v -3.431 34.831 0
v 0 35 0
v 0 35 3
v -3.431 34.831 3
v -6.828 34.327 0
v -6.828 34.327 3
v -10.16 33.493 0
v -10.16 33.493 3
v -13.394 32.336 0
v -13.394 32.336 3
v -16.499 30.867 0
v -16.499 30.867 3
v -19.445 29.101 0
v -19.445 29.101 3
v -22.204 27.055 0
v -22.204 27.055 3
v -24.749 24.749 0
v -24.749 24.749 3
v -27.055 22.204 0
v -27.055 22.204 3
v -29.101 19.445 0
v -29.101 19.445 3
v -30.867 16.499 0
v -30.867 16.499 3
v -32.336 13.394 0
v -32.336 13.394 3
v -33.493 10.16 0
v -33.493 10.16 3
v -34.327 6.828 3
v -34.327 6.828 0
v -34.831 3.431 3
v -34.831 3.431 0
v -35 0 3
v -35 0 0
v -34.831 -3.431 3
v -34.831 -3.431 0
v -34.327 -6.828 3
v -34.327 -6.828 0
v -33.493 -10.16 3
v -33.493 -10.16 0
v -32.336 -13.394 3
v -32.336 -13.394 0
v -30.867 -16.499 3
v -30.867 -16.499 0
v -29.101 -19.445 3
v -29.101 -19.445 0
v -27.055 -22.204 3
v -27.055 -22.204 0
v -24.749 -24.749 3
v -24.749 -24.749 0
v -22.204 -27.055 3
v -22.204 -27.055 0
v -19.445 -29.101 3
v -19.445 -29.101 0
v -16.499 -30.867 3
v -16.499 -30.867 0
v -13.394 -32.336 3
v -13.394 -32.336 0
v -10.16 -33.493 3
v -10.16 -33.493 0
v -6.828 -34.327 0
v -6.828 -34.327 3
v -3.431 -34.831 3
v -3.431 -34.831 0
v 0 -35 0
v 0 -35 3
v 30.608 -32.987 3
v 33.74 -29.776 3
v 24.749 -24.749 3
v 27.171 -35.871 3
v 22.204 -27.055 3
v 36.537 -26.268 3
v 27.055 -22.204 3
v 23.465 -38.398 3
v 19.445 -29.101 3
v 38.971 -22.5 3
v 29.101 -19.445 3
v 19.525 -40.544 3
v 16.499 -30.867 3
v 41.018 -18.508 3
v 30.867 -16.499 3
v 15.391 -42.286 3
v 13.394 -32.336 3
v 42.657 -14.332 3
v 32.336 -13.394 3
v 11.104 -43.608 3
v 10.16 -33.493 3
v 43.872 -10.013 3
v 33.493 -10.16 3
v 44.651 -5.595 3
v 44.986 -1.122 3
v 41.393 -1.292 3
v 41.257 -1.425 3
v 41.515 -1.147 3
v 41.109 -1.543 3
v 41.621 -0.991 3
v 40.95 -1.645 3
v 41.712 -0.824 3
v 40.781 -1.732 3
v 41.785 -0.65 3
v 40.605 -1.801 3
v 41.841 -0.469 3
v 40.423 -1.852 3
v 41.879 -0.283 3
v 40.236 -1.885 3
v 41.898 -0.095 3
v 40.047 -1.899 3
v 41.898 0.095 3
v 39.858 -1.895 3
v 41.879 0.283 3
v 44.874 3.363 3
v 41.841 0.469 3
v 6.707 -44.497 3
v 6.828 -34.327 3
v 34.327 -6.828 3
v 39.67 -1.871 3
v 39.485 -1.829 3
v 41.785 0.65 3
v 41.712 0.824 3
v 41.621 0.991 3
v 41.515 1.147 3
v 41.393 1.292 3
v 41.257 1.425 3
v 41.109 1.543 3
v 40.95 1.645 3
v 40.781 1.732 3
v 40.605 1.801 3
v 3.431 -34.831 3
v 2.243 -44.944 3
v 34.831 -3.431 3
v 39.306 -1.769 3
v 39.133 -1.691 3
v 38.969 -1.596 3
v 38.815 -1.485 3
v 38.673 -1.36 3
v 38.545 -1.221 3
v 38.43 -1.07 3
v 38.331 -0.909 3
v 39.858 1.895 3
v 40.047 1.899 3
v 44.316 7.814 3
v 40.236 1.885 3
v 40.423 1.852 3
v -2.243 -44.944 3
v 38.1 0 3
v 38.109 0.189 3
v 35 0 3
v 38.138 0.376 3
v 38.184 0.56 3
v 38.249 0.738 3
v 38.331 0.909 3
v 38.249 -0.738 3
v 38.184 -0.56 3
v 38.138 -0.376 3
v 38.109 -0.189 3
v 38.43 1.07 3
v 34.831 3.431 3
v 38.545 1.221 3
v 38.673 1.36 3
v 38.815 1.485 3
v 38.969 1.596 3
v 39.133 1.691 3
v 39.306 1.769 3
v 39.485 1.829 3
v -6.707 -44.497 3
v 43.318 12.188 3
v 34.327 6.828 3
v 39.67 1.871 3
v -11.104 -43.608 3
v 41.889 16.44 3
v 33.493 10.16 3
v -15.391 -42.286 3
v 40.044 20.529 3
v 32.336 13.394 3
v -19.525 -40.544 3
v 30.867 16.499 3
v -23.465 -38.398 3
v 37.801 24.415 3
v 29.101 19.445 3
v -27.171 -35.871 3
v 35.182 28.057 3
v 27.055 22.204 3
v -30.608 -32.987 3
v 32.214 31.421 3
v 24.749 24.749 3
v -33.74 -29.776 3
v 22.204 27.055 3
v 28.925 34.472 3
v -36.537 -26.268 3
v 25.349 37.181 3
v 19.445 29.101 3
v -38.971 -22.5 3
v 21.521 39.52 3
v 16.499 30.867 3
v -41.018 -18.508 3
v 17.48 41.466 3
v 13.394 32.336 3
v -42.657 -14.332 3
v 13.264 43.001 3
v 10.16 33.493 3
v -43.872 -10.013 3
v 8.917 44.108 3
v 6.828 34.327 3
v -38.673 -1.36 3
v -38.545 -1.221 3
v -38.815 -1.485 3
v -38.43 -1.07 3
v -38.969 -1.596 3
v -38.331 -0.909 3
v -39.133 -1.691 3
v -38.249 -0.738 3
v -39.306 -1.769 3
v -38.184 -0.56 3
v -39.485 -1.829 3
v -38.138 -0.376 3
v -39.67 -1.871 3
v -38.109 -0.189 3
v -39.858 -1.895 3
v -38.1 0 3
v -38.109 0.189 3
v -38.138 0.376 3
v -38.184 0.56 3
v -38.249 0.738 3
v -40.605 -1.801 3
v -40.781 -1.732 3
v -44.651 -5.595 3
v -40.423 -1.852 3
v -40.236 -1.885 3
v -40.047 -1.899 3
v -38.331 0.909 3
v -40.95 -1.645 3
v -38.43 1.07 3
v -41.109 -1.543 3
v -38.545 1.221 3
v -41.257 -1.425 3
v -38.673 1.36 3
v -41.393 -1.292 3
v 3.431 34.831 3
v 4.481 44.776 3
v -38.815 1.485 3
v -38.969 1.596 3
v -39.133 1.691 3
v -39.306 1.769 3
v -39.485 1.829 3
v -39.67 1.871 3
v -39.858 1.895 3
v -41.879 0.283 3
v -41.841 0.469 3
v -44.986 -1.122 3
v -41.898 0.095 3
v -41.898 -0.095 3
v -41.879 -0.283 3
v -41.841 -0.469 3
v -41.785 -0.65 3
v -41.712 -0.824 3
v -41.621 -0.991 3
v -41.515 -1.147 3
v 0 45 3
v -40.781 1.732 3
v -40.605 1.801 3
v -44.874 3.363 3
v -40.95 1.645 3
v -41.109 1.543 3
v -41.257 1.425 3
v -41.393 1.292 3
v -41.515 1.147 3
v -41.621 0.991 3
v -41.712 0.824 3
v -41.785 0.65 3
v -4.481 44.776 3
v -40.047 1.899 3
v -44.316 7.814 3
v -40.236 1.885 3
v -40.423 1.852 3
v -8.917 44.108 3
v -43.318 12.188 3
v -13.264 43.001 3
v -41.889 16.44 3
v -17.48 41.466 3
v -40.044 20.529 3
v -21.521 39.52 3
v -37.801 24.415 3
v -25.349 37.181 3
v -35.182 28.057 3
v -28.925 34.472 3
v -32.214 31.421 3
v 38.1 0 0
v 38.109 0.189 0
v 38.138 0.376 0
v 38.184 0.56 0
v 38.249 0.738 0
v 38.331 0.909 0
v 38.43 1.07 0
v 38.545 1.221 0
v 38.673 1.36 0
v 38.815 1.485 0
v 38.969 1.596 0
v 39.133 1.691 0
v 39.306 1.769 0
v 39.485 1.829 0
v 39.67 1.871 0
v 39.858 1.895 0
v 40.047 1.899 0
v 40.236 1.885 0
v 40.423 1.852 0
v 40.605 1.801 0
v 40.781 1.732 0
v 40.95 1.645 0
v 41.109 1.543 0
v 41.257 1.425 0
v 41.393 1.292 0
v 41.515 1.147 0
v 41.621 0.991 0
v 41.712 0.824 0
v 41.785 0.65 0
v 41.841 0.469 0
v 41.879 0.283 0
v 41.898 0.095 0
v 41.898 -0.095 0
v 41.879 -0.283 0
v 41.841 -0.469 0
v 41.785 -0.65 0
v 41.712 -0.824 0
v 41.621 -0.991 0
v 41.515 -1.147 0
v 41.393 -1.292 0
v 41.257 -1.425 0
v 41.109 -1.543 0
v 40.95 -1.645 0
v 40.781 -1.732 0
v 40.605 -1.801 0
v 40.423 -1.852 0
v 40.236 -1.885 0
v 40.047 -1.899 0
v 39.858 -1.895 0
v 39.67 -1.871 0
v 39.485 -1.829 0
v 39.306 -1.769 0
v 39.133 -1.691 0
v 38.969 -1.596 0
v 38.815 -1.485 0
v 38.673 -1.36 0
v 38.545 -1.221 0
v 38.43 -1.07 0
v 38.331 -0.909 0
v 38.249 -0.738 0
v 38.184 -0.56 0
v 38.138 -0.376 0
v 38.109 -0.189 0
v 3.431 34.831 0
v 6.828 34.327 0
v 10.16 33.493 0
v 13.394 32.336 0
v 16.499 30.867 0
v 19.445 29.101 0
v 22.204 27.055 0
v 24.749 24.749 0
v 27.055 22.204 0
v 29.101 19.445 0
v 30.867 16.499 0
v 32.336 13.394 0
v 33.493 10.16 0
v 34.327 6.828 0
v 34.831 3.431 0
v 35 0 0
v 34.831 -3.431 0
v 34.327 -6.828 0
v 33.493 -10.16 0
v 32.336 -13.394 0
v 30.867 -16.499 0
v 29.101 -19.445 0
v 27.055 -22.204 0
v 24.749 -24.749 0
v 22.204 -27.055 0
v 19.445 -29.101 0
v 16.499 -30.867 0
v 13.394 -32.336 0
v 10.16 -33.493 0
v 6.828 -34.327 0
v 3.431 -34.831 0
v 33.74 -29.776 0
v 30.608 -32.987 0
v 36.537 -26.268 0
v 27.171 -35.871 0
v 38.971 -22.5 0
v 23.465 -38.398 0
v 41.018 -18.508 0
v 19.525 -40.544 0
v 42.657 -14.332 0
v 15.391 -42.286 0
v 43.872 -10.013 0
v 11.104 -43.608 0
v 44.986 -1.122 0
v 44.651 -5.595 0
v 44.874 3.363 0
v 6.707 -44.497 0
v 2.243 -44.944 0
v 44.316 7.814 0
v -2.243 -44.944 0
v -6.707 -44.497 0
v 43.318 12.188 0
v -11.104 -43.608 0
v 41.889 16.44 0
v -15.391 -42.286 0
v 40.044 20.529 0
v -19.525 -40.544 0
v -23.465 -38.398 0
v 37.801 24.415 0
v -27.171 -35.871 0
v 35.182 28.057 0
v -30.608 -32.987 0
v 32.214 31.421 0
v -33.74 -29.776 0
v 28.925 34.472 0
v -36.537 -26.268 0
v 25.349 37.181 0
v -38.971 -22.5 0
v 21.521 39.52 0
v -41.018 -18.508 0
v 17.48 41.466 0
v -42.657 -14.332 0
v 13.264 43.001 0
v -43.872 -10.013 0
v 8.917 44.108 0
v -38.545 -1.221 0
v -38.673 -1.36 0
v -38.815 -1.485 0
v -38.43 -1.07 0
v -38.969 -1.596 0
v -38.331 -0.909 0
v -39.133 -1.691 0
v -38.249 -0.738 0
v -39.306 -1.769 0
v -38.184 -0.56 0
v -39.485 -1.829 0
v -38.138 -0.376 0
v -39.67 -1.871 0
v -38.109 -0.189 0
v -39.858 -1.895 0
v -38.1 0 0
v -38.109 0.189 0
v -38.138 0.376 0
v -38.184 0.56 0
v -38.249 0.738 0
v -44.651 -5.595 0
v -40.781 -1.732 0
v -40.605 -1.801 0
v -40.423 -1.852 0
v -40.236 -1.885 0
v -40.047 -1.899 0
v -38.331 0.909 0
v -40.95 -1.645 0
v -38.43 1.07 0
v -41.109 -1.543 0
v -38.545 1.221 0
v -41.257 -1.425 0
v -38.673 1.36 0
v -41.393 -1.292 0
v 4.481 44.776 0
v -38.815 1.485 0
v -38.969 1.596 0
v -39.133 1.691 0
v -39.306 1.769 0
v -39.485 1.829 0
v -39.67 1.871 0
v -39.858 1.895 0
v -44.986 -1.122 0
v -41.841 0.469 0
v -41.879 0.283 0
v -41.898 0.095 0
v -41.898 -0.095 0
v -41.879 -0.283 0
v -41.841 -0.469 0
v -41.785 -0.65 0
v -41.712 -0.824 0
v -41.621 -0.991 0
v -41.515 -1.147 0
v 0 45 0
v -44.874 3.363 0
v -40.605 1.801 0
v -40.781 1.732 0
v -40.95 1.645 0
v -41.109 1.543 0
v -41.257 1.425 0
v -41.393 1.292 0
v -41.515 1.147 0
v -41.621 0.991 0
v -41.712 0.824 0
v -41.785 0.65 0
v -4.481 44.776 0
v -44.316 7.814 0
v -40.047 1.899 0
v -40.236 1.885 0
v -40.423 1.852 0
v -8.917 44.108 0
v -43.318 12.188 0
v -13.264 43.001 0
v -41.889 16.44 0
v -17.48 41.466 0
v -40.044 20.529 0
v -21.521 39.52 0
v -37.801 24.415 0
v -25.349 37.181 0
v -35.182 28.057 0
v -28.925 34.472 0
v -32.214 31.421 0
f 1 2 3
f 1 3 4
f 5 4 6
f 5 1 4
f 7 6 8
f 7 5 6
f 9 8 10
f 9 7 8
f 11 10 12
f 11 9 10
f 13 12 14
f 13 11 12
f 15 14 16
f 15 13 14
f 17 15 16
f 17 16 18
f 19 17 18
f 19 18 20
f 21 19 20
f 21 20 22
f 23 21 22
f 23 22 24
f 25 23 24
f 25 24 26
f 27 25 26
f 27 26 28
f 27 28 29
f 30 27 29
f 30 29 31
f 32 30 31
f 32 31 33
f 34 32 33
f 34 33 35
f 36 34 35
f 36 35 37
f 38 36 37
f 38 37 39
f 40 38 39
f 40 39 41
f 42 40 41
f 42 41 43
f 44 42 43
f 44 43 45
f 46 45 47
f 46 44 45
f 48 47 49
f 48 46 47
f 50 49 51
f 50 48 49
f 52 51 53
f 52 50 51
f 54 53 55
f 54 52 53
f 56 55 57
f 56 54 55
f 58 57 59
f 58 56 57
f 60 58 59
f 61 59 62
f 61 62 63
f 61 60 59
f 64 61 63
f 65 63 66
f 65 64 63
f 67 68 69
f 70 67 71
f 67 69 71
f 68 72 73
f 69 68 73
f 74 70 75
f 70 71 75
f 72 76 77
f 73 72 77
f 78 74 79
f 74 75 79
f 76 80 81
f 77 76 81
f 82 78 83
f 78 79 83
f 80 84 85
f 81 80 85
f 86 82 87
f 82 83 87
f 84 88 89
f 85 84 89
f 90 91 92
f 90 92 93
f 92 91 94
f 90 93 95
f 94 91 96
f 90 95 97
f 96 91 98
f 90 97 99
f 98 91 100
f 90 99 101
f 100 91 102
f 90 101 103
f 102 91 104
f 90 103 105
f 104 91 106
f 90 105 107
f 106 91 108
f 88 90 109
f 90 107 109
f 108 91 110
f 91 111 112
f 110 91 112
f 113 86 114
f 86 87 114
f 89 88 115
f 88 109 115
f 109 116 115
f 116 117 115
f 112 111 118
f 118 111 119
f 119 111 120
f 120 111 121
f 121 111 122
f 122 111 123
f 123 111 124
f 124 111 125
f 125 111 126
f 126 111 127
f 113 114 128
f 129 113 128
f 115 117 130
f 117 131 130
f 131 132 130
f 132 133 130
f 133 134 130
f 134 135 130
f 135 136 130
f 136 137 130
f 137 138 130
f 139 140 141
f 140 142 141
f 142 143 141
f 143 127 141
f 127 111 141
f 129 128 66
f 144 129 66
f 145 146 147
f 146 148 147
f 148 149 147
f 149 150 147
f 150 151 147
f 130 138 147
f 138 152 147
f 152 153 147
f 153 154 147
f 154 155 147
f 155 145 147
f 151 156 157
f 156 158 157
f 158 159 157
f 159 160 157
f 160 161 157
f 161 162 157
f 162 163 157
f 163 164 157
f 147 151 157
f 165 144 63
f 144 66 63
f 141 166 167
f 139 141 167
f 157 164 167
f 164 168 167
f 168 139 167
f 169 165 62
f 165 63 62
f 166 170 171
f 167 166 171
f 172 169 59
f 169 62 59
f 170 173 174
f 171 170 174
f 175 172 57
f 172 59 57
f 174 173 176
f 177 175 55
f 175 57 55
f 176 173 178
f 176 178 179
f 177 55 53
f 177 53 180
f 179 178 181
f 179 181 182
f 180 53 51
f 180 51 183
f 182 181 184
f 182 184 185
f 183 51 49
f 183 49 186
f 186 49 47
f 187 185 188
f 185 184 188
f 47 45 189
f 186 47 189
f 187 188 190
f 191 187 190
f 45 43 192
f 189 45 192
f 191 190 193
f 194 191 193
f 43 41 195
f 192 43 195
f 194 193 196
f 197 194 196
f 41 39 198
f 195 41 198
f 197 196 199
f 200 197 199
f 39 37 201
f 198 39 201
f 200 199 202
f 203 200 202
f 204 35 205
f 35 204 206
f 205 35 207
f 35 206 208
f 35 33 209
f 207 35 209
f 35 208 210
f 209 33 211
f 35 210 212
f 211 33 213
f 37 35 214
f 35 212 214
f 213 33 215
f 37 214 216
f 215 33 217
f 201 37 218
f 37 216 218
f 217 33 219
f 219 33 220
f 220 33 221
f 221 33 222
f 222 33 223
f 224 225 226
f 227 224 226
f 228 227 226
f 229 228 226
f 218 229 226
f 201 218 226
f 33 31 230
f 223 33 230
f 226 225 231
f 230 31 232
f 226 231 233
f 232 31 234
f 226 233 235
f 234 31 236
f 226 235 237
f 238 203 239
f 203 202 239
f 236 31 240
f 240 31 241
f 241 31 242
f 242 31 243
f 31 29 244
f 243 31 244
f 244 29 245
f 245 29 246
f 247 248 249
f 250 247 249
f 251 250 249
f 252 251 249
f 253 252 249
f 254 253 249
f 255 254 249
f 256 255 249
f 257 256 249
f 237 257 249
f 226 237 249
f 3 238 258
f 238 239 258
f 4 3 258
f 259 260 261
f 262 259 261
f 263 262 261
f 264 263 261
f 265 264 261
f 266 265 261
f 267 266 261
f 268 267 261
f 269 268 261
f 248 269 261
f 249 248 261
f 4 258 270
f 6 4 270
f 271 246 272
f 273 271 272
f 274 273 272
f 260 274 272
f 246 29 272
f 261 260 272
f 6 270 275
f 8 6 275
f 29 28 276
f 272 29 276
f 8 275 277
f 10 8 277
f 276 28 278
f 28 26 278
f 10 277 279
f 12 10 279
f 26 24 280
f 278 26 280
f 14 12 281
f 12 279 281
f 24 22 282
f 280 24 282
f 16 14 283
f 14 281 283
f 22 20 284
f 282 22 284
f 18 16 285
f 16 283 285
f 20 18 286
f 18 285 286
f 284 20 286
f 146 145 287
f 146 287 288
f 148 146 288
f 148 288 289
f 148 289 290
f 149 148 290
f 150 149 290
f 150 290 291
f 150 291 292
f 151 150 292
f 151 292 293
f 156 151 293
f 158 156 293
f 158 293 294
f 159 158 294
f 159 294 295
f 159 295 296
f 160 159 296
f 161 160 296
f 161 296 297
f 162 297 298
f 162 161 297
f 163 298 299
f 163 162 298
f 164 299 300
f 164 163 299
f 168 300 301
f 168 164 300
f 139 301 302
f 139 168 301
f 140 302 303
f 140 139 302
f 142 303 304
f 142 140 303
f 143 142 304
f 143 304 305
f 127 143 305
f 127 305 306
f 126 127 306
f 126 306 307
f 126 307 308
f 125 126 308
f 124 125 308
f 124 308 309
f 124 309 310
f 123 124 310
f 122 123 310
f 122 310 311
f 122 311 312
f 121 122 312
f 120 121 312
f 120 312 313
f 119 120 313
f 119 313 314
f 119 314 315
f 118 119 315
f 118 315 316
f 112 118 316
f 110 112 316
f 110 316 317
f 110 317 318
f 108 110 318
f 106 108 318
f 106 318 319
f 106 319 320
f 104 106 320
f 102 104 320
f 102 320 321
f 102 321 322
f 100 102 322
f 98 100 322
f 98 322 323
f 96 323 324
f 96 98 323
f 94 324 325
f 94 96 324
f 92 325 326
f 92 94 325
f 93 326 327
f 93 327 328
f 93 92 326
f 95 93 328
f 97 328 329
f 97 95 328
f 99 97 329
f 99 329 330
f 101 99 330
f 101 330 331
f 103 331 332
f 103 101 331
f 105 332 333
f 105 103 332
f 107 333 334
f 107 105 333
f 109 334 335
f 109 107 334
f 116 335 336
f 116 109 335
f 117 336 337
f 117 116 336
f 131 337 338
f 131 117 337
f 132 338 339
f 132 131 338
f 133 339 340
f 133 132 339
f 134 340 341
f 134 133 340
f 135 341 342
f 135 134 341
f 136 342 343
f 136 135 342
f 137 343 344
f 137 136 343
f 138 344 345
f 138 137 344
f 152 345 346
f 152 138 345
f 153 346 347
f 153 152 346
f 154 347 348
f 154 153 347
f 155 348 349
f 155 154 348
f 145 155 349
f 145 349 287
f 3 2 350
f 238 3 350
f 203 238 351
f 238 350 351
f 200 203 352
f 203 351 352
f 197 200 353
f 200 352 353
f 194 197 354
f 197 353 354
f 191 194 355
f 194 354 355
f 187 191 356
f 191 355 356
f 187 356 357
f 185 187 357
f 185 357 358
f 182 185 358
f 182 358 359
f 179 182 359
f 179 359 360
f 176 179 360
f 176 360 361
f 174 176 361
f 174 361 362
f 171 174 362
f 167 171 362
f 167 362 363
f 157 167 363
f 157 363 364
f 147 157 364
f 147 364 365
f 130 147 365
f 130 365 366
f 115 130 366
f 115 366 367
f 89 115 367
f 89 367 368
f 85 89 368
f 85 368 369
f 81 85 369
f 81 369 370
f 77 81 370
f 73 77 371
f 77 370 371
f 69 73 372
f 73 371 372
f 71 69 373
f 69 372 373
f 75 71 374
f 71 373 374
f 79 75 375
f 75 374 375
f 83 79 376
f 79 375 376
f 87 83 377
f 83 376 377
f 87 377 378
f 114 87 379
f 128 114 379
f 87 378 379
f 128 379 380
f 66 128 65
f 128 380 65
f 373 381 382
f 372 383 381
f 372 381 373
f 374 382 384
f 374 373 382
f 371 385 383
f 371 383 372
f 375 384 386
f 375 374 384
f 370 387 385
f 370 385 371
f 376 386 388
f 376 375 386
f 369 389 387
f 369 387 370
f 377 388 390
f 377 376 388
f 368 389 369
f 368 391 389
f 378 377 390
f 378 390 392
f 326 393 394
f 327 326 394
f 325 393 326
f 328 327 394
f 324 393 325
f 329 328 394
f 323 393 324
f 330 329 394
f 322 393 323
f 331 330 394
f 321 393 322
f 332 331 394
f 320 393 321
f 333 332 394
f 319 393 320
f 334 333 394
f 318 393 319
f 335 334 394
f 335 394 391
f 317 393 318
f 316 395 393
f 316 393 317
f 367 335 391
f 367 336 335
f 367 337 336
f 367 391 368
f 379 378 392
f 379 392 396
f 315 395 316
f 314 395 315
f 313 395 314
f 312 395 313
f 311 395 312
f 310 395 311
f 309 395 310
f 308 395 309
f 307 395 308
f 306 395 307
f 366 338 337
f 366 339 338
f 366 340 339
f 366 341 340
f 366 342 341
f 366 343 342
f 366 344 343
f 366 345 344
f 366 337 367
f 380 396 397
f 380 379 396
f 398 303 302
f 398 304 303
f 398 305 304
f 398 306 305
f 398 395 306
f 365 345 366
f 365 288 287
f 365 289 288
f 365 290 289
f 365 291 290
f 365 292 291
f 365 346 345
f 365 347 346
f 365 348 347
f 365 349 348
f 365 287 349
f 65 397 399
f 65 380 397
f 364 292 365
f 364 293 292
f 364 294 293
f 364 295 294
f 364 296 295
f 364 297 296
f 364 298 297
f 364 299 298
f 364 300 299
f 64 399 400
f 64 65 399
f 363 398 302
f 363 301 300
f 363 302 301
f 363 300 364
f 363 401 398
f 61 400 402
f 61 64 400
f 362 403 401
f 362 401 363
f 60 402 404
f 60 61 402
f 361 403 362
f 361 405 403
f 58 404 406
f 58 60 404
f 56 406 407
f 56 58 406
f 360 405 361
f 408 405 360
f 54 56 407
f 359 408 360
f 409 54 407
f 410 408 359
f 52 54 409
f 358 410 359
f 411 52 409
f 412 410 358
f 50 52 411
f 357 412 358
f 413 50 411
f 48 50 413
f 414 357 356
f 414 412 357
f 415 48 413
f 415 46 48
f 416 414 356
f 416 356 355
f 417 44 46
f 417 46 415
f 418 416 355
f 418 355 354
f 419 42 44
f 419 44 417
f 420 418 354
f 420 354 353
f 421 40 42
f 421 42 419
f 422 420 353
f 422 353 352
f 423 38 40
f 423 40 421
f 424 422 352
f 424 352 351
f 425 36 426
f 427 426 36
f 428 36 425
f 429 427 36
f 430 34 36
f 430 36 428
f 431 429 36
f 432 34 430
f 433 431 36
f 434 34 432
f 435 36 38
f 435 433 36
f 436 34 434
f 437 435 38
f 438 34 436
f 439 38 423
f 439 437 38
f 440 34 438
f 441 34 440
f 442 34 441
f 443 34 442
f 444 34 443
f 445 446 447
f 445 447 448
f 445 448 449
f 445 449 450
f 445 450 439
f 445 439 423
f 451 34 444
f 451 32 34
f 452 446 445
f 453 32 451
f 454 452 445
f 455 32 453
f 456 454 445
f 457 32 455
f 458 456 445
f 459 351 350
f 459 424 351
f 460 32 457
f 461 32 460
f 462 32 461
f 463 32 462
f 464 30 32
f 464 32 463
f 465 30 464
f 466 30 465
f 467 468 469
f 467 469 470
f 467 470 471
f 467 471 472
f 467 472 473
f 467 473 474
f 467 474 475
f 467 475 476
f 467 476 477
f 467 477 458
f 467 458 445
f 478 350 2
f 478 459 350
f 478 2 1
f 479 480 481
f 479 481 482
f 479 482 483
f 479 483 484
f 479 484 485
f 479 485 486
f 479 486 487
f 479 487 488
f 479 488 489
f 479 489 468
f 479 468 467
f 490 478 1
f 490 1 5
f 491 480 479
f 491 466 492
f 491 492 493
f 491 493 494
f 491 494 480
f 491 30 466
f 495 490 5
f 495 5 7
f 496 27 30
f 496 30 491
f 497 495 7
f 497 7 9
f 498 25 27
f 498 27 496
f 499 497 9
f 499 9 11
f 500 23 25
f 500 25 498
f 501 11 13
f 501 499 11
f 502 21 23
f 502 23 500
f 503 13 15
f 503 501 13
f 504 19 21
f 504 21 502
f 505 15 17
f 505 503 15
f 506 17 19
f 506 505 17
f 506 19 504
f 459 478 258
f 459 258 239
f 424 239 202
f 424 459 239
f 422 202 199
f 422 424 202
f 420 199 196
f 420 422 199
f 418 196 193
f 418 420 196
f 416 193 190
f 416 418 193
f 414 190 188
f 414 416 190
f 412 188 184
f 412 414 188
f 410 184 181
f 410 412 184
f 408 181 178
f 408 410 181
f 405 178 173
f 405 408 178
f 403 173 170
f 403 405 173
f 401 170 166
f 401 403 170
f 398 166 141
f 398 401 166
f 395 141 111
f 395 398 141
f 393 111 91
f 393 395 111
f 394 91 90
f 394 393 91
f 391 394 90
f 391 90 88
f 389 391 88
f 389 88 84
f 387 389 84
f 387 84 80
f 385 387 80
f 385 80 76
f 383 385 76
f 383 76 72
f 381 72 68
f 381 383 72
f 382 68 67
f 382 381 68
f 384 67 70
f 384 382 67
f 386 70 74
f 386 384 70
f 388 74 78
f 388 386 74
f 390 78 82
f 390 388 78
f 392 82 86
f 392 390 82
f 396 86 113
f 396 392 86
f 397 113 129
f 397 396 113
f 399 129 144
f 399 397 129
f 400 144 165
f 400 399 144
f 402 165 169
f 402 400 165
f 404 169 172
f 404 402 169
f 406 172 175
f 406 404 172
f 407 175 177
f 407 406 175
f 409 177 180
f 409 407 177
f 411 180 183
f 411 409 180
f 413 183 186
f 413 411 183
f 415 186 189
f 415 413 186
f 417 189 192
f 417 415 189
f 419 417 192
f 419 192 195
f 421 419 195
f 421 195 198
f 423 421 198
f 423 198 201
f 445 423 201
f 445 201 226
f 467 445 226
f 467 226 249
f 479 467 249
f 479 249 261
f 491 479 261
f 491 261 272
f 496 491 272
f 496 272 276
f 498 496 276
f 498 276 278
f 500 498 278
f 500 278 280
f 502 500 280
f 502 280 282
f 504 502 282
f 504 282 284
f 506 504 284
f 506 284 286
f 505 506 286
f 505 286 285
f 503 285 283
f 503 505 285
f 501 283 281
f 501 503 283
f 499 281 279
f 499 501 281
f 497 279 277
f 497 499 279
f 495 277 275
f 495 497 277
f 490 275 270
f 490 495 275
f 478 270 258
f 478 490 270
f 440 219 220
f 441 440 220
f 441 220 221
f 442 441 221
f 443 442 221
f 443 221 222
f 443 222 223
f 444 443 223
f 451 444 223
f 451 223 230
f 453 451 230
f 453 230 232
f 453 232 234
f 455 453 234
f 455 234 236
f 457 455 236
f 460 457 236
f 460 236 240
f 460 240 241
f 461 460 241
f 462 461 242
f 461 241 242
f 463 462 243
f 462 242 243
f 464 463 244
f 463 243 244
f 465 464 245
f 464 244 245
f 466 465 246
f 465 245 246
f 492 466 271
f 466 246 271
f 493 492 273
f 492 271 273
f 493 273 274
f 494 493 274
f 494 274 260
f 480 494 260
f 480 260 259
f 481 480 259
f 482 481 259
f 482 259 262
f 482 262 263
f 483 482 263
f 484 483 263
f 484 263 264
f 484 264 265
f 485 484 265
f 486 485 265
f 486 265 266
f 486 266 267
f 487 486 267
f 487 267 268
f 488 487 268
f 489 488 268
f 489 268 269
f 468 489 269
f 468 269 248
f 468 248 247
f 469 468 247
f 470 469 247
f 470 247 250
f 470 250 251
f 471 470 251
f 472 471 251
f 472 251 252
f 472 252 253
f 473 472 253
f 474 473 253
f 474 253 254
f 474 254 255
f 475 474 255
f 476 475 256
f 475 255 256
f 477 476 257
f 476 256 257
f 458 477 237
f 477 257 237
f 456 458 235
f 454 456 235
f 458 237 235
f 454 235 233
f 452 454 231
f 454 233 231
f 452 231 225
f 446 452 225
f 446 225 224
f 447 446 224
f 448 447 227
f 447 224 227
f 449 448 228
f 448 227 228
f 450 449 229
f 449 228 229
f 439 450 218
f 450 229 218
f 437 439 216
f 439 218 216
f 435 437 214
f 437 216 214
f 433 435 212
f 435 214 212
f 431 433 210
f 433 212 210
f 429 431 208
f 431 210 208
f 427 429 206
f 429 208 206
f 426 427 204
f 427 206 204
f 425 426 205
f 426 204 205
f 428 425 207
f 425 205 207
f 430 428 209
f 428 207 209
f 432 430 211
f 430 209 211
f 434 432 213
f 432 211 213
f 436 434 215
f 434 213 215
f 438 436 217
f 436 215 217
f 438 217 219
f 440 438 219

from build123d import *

# Parameters (mm, degrees)
F0_R     = 45
F0_R_2   = 35
F1_DEPTH = 3
F2_R     = 1.9
F3_DEPTH = 25
F4_W     = 55.17469
F4_H     = 97.550949
F5_DEPTH = 25


with BuildPart() as f1:
    # F0 (on Top) → F1 (new body)
    with BuildSketch(Plane.XY):
        Circle(F0_R)
        Circle(F0_R_2, mode=Mode.SUBTRACT)
    extrude(amount=F1_DEPTH)

    # F2 (on face) → F3 (cut)
    with BuildSketch(Plane.XY.offset(3)):
        with Locations((-40, 0)):
            Circle(F2_R)
        with Locations((40, 0)):
            Circle(F2_R)
    extrude(amount=-F3_DEPTH, mode=Mode.SUBTRACT)

    # F4 (on face) → F5 (cut)
    with BuildSketch(Plane.XY.offset(3)):
        with Locations((27.587345, 3.775474)):
            Rectangle(F4_W, F4_H)
    extrude(amount=-F5_DEPTH, mode=Mode.SUBTRACT)

    # F6: F1 across face


with BuildPart() as f1_1:
    add(f1.part)
    add(f1.part.mirror(Plane(origin=(0, 40, 1.5), x_dir=(0, 1, 0), z_dir=(1, 0, 0))))


solid = f1_1.part
